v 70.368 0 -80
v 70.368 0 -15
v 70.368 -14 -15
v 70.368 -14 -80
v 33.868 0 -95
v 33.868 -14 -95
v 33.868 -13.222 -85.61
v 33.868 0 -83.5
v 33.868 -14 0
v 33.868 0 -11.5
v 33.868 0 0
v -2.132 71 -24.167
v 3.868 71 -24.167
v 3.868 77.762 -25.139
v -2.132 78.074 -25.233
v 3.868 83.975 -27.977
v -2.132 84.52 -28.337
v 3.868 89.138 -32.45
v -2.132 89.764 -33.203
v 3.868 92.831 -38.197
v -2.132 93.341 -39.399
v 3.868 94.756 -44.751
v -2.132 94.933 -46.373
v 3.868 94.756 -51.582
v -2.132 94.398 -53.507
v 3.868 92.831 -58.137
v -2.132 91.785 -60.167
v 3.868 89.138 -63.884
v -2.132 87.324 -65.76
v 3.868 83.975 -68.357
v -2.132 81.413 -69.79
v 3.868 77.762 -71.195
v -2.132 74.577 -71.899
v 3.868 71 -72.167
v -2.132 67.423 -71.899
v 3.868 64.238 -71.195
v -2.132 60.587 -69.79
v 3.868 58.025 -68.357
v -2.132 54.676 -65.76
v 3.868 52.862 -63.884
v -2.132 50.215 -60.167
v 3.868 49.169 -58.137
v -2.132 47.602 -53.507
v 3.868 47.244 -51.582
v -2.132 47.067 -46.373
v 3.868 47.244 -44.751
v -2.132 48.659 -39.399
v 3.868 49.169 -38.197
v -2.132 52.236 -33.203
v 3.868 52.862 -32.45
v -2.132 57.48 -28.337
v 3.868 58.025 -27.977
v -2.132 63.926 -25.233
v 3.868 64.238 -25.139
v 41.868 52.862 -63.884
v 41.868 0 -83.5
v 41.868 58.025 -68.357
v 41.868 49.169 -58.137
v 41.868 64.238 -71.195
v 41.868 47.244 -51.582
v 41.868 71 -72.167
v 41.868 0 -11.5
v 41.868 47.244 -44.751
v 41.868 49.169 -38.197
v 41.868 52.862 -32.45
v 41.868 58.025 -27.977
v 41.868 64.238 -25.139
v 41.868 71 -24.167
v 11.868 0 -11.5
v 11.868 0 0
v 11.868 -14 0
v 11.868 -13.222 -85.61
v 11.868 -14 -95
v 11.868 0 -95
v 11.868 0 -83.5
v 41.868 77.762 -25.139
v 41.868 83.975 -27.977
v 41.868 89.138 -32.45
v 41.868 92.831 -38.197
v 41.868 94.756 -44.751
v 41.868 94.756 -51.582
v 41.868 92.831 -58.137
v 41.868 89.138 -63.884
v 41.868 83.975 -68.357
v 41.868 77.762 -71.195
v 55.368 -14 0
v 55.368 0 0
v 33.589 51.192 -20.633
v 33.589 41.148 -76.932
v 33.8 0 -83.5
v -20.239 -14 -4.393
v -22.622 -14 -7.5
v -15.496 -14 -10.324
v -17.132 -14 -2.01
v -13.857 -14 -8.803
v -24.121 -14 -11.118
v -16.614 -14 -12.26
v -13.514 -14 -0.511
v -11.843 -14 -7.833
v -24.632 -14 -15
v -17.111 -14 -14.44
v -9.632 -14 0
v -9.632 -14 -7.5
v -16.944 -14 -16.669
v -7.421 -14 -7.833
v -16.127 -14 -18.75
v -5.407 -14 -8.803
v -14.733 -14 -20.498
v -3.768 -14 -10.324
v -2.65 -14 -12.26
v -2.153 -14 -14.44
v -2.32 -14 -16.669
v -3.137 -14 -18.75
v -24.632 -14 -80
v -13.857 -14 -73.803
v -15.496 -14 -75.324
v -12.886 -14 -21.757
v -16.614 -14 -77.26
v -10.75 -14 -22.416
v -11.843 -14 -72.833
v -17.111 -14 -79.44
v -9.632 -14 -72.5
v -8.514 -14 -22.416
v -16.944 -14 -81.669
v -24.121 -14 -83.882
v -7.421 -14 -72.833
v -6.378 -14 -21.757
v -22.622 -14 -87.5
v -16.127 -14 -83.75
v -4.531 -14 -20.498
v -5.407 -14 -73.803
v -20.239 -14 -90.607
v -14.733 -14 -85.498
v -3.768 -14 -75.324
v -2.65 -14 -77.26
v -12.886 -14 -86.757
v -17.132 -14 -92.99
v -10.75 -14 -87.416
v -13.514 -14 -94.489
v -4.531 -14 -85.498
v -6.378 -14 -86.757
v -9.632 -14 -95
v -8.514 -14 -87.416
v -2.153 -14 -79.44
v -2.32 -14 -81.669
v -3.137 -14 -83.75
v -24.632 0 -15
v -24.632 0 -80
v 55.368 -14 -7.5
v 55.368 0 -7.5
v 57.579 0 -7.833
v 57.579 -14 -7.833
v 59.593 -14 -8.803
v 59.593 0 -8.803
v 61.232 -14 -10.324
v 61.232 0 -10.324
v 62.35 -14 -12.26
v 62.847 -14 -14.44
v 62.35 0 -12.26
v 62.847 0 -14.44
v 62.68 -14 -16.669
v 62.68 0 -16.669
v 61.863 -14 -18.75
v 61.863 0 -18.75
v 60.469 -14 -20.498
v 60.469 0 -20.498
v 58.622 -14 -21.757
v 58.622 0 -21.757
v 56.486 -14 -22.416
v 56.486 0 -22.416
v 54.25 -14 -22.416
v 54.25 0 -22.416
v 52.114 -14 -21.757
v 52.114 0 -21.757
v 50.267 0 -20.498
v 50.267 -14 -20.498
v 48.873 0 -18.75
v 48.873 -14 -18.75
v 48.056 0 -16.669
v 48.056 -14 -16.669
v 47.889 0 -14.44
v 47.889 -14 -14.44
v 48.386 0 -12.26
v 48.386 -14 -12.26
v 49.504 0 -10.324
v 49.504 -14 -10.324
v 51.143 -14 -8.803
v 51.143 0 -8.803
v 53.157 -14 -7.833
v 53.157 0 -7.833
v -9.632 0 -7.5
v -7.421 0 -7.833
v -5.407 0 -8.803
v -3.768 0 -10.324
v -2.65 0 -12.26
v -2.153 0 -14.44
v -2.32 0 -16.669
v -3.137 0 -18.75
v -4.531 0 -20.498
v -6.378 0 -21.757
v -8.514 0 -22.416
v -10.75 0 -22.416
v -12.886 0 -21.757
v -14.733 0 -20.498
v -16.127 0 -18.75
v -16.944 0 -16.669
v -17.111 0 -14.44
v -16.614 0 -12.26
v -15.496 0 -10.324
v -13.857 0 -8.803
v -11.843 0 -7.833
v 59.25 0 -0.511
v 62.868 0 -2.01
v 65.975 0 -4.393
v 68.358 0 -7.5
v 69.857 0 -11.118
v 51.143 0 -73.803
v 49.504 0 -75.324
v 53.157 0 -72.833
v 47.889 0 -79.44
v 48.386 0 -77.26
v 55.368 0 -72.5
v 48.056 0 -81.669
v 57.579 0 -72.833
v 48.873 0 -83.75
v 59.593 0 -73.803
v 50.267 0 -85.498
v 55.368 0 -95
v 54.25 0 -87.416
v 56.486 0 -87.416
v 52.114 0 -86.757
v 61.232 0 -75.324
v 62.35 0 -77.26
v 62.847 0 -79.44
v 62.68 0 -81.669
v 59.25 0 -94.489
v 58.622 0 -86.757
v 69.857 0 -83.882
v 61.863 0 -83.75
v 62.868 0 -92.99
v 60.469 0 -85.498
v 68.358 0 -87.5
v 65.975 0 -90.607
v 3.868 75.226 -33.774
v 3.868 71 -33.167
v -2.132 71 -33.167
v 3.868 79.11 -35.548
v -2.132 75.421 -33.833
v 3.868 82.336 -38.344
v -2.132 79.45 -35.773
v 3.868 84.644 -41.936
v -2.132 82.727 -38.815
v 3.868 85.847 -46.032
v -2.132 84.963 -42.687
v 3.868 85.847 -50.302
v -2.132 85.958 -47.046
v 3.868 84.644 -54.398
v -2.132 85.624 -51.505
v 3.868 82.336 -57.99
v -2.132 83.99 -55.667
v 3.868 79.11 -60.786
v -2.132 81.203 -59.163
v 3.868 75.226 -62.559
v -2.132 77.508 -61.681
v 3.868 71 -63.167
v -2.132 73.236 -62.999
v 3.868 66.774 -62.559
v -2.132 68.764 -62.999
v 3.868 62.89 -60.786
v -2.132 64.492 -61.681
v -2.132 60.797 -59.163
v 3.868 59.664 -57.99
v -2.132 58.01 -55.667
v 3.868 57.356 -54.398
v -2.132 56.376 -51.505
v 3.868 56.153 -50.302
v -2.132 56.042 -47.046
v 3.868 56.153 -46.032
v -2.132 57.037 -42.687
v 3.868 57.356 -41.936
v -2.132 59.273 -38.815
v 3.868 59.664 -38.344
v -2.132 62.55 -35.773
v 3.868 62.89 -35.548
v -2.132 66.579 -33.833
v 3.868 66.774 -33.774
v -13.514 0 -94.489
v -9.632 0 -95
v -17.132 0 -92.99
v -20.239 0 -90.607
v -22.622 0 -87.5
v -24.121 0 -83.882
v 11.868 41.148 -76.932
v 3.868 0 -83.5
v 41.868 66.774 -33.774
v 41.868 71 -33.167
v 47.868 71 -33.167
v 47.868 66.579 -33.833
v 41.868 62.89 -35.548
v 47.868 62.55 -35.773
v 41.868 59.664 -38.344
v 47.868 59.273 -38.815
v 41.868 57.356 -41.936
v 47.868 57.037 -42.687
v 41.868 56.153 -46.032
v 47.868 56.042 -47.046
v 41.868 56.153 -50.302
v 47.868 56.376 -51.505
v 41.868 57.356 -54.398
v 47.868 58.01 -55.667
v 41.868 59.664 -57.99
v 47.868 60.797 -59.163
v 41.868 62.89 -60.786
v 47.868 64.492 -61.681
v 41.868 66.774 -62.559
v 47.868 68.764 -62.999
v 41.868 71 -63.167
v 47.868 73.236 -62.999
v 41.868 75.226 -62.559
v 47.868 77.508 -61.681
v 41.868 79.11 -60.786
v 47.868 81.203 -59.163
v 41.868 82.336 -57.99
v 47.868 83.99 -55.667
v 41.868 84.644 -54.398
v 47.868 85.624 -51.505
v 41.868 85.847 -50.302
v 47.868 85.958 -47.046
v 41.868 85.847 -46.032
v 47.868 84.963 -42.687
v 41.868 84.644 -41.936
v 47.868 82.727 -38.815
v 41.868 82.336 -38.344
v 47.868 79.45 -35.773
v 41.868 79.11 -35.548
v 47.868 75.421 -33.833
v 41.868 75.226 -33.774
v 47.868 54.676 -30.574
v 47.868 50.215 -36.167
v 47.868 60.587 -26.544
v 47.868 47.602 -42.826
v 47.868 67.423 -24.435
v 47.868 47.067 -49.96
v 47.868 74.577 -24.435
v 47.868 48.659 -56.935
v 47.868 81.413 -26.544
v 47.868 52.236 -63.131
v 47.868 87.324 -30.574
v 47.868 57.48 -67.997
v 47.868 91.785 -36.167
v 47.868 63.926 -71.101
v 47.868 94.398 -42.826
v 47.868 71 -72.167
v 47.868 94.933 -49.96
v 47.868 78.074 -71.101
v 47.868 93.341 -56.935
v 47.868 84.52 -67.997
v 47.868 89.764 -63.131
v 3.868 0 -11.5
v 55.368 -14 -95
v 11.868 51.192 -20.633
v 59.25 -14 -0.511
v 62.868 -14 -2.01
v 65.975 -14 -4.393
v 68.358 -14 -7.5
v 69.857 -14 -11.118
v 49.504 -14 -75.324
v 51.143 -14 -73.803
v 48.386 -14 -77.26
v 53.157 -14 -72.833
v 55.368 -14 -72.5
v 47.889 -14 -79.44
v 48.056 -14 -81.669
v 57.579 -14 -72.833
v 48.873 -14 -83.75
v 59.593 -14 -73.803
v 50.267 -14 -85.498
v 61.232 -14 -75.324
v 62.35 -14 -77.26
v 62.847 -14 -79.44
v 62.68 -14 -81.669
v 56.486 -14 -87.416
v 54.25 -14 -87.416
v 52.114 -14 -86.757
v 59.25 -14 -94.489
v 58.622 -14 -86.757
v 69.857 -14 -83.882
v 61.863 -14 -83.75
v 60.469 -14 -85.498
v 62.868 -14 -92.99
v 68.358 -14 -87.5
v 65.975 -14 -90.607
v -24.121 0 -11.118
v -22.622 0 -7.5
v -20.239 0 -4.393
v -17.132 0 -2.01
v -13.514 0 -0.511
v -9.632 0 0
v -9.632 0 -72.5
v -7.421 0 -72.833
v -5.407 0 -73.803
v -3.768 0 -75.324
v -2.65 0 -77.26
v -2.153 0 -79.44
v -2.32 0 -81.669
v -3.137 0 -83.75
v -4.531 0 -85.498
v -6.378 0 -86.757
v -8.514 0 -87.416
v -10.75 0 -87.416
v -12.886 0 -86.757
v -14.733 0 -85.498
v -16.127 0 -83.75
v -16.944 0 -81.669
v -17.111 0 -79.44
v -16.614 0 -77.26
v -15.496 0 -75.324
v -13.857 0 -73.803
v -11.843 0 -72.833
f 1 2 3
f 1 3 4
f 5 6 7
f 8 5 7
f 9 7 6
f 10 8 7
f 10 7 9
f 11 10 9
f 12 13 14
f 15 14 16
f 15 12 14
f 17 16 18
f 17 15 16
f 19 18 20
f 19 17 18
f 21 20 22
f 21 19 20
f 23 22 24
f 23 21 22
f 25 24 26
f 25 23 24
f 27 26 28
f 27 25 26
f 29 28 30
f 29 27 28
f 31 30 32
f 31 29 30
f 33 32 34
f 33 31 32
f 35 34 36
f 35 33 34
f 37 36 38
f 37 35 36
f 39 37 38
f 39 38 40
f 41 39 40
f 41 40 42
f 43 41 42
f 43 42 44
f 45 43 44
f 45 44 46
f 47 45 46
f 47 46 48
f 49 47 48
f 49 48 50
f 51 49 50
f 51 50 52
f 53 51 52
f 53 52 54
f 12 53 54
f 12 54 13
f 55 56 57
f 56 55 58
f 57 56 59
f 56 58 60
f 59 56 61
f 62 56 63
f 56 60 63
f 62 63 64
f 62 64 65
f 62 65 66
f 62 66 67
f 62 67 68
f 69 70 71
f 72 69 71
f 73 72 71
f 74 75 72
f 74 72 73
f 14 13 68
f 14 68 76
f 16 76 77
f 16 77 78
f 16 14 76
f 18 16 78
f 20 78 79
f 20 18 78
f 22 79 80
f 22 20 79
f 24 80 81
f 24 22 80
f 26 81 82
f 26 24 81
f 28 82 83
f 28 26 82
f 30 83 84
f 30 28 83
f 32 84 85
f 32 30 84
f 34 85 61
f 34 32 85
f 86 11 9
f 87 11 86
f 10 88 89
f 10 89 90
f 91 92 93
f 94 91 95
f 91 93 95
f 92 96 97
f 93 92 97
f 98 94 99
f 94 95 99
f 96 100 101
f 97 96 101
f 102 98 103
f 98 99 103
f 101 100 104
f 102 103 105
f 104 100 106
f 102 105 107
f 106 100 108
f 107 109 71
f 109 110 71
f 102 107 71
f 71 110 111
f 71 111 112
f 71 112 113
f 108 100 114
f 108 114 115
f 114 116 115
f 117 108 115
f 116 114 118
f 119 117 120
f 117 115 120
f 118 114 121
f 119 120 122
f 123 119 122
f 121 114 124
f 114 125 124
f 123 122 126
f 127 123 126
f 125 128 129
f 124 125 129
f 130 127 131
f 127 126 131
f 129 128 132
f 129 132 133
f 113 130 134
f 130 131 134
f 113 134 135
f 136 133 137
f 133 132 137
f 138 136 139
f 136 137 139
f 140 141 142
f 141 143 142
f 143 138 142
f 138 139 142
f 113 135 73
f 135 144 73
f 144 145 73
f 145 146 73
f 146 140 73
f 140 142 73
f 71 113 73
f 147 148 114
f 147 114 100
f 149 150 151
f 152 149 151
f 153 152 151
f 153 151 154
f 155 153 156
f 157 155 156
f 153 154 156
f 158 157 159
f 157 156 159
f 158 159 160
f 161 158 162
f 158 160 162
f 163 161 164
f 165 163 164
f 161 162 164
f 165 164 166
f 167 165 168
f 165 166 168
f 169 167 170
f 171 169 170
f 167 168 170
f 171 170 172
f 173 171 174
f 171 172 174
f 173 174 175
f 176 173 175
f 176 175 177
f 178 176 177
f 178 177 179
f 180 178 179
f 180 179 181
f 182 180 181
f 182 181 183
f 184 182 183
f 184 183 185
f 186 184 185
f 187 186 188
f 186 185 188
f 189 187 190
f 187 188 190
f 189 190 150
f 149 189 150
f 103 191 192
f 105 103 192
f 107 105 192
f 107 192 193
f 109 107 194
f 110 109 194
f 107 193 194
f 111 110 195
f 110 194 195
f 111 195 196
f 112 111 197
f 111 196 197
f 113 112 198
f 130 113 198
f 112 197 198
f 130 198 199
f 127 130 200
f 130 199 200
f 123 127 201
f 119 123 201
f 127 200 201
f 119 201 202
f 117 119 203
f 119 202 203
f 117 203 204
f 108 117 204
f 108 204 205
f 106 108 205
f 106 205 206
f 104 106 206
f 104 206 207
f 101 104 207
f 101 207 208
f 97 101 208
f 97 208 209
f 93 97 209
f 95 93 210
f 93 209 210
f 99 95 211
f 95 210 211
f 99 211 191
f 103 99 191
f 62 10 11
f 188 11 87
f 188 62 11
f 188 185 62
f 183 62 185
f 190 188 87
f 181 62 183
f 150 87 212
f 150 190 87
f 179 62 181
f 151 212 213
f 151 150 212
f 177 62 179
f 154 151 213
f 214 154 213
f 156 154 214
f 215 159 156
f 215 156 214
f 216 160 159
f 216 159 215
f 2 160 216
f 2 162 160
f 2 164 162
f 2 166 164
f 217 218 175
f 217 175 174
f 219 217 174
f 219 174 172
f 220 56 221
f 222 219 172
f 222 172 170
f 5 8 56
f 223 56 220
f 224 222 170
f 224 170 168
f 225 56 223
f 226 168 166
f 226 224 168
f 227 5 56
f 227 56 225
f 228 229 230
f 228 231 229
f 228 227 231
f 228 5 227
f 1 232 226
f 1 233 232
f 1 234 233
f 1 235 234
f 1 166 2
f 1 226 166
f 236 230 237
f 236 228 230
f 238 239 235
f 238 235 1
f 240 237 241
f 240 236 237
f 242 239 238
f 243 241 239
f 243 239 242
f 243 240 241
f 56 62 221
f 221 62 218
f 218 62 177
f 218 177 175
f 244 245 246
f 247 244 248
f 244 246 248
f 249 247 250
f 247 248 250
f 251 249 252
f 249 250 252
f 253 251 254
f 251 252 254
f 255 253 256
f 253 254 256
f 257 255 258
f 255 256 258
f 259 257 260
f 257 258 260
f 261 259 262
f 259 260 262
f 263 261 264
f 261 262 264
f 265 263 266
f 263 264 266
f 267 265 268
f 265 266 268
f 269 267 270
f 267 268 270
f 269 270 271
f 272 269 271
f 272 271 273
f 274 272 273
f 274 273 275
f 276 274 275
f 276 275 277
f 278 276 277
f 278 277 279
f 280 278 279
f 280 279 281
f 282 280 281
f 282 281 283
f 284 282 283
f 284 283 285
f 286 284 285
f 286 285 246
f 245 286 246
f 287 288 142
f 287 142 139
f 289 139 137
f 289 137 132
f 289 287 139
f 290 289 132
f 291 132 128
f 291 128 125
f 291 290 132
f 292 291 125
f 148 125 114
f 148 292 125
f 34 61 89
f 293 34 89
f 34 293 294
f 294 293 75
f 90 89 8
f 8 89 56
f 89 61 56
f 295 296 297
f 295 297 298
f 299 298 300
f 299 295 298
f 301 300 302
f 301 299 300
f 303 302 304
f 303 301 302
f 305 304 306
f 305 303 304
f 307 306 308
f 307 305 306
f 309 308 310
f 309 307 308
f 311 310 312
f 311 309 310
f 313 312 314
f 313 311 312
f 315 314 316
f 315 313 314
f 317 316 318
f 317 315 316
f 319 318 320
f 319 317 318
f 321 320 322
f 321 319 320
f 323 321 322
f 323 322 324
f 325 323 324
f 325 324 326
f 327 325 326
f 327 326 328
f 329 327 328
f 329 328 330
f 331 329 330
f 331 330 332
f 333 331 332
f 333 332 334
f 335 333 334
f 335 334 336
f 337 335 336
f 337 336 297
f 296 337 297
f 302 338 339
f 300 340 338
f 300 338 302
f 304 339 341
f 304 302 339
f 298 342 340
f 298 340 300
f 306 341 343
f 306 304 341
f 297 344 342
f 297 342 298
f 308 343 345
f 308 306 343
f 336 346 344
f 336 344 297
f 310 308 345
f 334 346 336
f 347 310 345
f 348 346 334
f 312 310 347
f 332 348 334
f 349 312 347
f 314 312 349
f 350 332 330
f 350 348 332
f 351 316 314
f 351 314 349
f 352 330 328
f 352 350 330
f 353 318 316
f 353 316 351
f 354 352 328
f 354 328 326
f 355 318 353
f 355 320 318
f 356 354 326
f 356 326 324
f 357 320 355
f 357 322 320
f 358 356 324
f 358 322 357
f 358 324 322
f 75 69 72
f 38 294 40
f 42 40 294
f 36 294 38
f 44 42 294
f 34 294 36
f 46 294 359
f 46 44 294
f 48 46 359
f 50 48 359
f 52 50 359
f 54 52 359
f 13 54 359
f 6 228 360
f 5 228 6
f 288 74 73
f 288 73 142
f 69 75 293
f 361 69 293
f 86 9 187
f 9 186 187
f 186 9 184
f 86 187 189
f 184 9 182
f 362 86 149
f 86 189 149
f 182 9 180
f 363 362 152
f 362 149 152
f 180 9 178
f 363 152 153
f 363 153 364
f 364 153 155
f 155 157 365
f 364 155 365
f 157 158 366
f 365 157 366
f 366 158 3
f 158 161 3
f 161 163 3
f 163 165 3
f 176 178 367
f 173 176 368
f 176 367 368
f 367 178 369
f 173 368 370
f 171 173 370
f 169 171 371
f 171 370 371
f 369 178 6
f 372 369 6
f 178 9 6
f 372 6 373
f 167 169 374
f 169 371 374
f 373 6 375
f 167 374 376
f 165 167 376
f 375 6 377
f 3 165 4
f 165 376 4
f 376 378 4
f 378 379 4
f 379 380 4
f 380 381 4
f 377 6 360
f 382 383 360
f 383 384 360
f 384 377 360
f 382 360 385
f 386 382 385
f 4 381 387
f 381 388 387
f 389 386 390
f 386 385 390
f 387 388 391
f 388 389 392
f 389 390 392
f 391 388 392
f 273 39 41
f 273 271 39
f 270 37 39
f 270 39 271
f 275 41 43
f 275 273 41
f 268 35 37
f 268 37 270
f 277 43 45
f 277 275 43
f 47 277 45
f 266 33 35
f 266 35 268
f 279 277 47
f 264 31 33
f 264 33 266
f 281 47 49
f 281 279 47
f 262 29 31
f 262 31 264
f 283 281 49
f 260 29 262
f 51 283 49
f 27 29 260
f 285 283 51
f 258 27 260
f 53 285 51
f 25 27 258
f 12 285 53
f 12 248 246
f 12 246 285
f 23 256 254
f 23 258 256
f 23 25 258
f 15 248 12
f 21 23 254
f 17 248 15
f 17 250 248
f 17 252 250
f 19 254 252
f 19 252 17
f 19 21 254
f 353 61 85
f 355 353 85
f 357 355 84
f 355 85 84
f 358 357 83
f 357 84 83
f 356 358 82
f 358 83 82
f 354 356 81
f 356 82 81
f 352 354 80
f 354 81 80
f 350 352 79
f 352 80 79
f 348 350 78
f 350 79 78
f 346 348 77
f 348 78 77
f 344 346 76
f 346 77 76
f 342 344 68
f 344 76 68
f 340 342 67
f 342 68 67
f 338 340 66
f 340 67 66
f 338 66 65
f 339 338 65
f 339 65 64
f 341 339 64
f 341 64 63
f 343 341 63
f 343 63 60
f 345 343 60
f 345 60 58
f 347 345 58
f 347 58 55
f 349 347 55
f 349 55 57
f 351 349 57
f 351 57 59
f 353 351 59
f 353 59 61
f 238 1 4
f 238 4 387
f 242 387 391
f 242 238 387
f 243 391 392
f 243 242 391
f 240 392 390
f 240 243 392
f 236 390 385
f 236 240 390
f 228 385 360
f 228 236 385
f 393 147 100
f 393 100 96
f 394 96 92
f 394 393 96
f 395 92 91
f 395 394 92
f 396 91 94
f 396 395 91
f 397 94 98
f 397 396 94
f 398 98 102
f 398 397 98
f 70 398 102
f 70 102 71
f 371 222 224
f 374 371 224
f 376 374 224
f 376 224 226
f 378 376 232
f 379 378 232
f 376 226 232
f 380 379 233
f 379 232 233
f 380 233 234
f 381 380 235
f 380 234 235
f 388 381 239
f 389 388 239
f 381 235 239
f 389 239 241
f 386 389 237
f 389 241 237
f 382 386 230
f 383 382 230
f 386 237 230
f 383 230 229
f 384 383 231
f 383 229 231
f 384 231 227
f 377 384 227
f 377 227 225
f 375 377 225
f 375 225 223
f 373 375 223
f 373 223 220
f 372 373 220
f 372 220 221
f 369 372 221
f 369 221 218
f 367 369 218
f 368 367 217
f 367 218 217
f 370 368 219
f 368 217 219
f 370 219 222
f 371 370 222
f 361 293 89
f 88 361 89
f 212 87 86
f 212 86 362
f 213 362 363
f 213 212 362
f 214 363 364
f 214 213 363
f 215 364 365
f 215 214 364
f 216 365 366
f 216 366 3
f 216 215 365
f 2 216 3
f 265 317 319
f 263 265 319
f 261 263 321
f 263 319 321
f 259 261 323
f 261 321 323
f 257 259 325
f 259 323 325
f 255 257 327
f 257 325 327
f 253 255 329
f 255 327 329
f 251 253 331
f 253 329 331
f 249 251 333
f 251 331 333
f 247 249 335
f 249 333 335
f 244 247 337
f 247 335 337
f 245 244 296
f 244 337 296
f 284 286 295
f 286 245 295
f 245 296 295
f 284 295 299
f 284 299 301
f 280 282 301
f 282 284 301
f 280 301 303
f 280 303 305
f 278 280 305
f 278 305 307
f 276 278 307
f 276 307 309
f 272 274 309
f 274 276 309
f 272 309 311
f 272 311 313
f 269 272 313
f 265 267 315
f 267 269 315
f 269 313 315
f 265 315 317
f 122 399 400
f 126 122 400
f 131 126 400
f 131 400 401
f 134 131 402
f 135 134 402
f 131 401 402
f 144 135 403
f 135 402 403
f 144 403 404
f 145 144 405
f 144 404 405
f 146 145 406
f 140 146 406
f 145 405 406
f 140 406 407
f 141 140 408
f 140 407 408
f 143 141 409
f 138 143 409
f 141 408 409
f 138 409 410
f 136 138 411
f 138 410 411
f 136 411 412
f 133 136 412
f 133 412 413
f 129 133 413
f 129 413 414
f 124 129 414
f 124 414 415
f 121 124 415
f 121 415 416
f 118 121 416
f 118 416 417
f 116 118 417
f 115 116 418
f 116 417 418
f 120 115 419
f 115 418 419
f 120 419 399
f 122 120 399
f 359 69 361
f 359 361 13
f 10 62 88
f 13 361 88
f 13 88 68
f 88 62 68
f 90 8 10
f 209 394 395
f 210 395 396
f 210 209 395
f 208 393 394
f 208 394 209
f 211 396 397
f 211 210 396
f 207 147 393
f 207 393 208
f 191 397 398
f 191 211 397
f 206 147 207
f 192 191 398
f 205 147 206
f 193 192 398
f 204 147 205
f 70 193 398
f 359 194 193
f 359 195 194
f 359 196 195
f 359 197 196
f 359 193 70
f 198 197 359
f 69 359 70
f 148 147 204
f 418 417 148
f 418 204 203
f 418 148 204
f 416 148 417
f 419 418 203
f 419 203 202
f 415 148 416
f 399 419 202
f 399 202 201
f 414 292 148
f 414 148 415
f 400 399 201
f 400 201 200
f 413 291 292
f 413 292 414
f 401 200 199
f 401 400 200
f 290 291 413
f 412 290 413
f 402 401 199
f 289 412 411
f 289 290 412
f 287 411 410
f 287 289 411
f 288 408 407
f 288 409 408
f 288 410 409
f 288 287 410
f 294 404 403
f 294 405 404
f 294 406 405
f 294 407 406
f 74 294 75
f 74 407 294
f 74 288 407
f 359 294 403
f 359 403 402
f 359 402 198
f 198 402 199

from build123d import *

# Parameters (mm, degrees)
SKETCH2_R             = 7.5
BOSS_EXTRUDE2_DEPTH   = 14
BOSS_EXTRUDE2_2_DEPTH = 14
BOSS_EXTRUDE3_DEPTH   = 8
BOSS_EXTRUDE4_DEPTH   = 30
BOSS_EXTRUDE5_START   = 6
SKETCH6_R             = 24
SKETCH6_R_2           = 15
BOSS_EXTRUDE5_DEPTH   = 6
SKETCH7_R             = 24
SKETCH7_R_2           = 15
BOSS_EXTRUDE6_DEPTH   = 6
CUT_EXTRUDE1_REACH    = 151.907
SKETCH8_R             = 15
CUT_EXTRUDE2_REACH    = 148.253


with BuildPart() as part:
    # Sketch2 → Boss-Extrude2 (new body)
    with BuildSketch(Plane(origin=(0, 0, 0), x_dir=(1, 0, 0), z_dir=(0, 1, 0))):
        with BuildLine():
            Line((-9.632034576, 0), (11.867965424, 0))
            Line((11.867965424, 0), (11.867965424, 95))
            Line((11.867965424, 95), (-9.632034576, 95))
            ThreePointArc((-9.632034576, 95), (-20.238636294, 90.606601718), (-24.632034576, 80))
            Line((-24.632034576, 80), (-24.632034576, 15))
            ThreePointArc((-24.632034576, 15), (-20.238636294, 4.393398282), (-9.632034576, 0))
        make_face()
        with Locations(Location((-9.632034576, 15, 0), (0, 0, 270))):
            Circle(SKETCH2_R, mode=Mode.SUBTRACT)
        with Locations(Location((-9.632034576, 80, 0), (0, 0, 270))):
            Circle(SKETCH2_R, mode=Mode.SUBTRACT)
    extrude(amount=-BOSS_EXTRUDE2_DEPTH)



with BuildPart() as body_2:
    # Sketch2 → Boss-Extrude2 2 (new body)
    with BuildSketch(Plane(origin=(0, 0, 0), x_dir=(1, 0, 0), z_dir=(0, 1, 0))):
        with BuildLine():
            Line((33.867965424, 0), (55.367965424, 0))
            ThreePointArc((55.367965424, 0), (65.974567142, 4.393398282), (70.367965424, 15))
            Line((70.367965424, 15), (70.367965424, 80))
            ThreePointArc((70.367965424, 80), (65.974567142, 90.606601718), (55.367965424, 95))
            Line((55.367965424, 95), (33.867965424, 95))
            Line((33.867965424, 95), (33.867965424, 0))
        make_face()
        with Locations(Location((55.367965424, 15, 0), (0, 0, 270))):
            Circle(SKETCH2_R, mode=Mode.SUBTRACT)
        with Locations(Location((55.367965424, 80, 0), (0, 0, 270))):
            Circle(SKETCH2_R, mode=Mode.SUBTRACT)
    extrude(amount=-BOSS_EXTRUDE2_2_DEPTH)

    # Sketch4 → Boss-Extrude3 (add)
    with BuildSketch(Plane.ZY.offset(-33.867965424)):
        with BuildLine():
            ThreePointArc((-24.166847457, 71), (-48.166847457, 47), (-72.166847457, 71))
            Line((-72.166847457, 71), (-83.5, 0))
            Line((-83.5, 0), (-11.5, 0))
            Line((-11.5, 0), (-24.166847457, 71))
        make_face()
        with BuildLine():
            ThreePointArc((-24.166847457, 71), (-48.166847457, 95), (-72.166847457, 71))
            Line((-72.166847457, 71), (-24.166847457, 71))
        make_face()
        with BuildLine():
            Line((-24.166847457, 71), (-72.166847457, 71))
            ThreePointArc((-72.166847457, 71), (-48.166847457, 47), (-24.166847457, 71))
        make_face()
    extrude(amount=-BOSS_EXTRUDE3_DEPTH)


with BuildPart() as part_1:
    add(part.part)

    add(body_2.part)  # Boss-Extrude4 merges body 2
    # Sketch5 → Boss-Extrude4 (add)
    with BuildSketch(Plane.ZY.offset(-33.867965424)):
        with BuildLine():
            Line((-72.166847457, 71), (-83.5, 0))
            Line((-83.5, 0), (-11.5, 0))
            Line((-11.5, 0), (-24.166847457, 71))
            ThreePointArc((-24.166847457, 71), (-48.166847457, 47), (-72.166847457, 71))
        make_face()
        with BuildLine():
            ThreePointArc((-24.166847457, 71), (-48.166847457, 95), (-72.166847457, 71))
            ThreePointArc((-72.166847457, 71), (-48.166847457, 47), (-24.166847457, 71))
        make_face()
    extrude(amount=BOSS_EXTRUDE4_DEPTH)

    # Sketch6 → Boss-Extrude5 (add)
    with BuildSketch(Plane.ZY.offset(-3.867965424).offset(BOSS_EXTRUDE5_START)):
        with Locations((-48.166847457, 71)):
            Circle(SKETCH6_R)
        with Locations((-48.166847457, 71)):
            Circle(SKETCH6_R_2, mode=Mode.SUBTRACT)
    extrude(amount=-BOSS_EXTRUDE5_DEPTH)

    # Sketch7 → Boss-Extrude6 (add)
    with BuildSketch(Plane(origin=(41.867965424, 0, 0), x_dir=(0, 0, -1), z_dir=(1, 0, 0))):
        with Locations((48.166847457, 71)):
            Circle(SKETCH7_R)
        with Locations(Location((48.166847457, 71, 0), (0, 0, 180))):
            Circle(SKETCH7_R_2, mode=Mode.SUBTRACT)
    extrude(amount=BOSS_EXTRUDE6_DEPTH)

    # Sketch8 → Cut-Extrude1 (cut, up to next)
    with BuildSketch(Plane(origin=(41.867965424, 0, 0), x_dir=(0, 0, -1), z_dir=(1, 0, 0)), mode=Mode.PRIVATE) as cut_extrude1_sk1:
        with Locations((48.166847457, 71)):
            Circle(SKETCH8_R)
    cut_extrude1_tool1 = extrude(cut_extrude1_sk1.sketch, amount=-CUT_EXTRUDE1_REACH, mode=Mode.PRIVATE) & part_1.part
    add(cut_extrude1_tool1.solids().sort_by_distance((41.867965, 71, -48.166847))[0], mode=Mode.SUBTRACT)

    # Cut-Extrude2: up to this plane
    cut_extrude2_end = Plane(origin=(3.867965424, 12.997266696, -81.425352027), z_dir=(0, -0.1576264048748577, 0.9874988184733324))
    # Sketch9 → Cut-Extrude2 (cut, up to the surface)
    with BuildSketch(Plane(origin=(0, -1.988384564, -11.145259663), x_dir=(1, 0, 0), z_dir=(0, 0.1756331001157612, 0.9844556943528373)), mode=Mode.PRIVATE) as cut_extrude2_sk1:
        Polygon((11.867965424, 2.019780651), (11.867965424, 54.019780651), (33.588609599, 54.019780651), (33.867965424, 2.019780651), align=None)
    cut_extrude2_tool1 = split(extrude(cut_extrude2_sk1.sketch, amount=-CUT_EXTRUDE2_REACH, mode=Mode.PRIVATE), bisect_by=cut_extrude2_end, keep=Keep.BOTH, mode=Mode.PRIVATE)
    add(cut_extrude2_tool1.solids().sort_by_distance((22.798275, 25.541333, -16.056735))[0], mode=Mode.SUBTRACT)


solid = part_1.part
